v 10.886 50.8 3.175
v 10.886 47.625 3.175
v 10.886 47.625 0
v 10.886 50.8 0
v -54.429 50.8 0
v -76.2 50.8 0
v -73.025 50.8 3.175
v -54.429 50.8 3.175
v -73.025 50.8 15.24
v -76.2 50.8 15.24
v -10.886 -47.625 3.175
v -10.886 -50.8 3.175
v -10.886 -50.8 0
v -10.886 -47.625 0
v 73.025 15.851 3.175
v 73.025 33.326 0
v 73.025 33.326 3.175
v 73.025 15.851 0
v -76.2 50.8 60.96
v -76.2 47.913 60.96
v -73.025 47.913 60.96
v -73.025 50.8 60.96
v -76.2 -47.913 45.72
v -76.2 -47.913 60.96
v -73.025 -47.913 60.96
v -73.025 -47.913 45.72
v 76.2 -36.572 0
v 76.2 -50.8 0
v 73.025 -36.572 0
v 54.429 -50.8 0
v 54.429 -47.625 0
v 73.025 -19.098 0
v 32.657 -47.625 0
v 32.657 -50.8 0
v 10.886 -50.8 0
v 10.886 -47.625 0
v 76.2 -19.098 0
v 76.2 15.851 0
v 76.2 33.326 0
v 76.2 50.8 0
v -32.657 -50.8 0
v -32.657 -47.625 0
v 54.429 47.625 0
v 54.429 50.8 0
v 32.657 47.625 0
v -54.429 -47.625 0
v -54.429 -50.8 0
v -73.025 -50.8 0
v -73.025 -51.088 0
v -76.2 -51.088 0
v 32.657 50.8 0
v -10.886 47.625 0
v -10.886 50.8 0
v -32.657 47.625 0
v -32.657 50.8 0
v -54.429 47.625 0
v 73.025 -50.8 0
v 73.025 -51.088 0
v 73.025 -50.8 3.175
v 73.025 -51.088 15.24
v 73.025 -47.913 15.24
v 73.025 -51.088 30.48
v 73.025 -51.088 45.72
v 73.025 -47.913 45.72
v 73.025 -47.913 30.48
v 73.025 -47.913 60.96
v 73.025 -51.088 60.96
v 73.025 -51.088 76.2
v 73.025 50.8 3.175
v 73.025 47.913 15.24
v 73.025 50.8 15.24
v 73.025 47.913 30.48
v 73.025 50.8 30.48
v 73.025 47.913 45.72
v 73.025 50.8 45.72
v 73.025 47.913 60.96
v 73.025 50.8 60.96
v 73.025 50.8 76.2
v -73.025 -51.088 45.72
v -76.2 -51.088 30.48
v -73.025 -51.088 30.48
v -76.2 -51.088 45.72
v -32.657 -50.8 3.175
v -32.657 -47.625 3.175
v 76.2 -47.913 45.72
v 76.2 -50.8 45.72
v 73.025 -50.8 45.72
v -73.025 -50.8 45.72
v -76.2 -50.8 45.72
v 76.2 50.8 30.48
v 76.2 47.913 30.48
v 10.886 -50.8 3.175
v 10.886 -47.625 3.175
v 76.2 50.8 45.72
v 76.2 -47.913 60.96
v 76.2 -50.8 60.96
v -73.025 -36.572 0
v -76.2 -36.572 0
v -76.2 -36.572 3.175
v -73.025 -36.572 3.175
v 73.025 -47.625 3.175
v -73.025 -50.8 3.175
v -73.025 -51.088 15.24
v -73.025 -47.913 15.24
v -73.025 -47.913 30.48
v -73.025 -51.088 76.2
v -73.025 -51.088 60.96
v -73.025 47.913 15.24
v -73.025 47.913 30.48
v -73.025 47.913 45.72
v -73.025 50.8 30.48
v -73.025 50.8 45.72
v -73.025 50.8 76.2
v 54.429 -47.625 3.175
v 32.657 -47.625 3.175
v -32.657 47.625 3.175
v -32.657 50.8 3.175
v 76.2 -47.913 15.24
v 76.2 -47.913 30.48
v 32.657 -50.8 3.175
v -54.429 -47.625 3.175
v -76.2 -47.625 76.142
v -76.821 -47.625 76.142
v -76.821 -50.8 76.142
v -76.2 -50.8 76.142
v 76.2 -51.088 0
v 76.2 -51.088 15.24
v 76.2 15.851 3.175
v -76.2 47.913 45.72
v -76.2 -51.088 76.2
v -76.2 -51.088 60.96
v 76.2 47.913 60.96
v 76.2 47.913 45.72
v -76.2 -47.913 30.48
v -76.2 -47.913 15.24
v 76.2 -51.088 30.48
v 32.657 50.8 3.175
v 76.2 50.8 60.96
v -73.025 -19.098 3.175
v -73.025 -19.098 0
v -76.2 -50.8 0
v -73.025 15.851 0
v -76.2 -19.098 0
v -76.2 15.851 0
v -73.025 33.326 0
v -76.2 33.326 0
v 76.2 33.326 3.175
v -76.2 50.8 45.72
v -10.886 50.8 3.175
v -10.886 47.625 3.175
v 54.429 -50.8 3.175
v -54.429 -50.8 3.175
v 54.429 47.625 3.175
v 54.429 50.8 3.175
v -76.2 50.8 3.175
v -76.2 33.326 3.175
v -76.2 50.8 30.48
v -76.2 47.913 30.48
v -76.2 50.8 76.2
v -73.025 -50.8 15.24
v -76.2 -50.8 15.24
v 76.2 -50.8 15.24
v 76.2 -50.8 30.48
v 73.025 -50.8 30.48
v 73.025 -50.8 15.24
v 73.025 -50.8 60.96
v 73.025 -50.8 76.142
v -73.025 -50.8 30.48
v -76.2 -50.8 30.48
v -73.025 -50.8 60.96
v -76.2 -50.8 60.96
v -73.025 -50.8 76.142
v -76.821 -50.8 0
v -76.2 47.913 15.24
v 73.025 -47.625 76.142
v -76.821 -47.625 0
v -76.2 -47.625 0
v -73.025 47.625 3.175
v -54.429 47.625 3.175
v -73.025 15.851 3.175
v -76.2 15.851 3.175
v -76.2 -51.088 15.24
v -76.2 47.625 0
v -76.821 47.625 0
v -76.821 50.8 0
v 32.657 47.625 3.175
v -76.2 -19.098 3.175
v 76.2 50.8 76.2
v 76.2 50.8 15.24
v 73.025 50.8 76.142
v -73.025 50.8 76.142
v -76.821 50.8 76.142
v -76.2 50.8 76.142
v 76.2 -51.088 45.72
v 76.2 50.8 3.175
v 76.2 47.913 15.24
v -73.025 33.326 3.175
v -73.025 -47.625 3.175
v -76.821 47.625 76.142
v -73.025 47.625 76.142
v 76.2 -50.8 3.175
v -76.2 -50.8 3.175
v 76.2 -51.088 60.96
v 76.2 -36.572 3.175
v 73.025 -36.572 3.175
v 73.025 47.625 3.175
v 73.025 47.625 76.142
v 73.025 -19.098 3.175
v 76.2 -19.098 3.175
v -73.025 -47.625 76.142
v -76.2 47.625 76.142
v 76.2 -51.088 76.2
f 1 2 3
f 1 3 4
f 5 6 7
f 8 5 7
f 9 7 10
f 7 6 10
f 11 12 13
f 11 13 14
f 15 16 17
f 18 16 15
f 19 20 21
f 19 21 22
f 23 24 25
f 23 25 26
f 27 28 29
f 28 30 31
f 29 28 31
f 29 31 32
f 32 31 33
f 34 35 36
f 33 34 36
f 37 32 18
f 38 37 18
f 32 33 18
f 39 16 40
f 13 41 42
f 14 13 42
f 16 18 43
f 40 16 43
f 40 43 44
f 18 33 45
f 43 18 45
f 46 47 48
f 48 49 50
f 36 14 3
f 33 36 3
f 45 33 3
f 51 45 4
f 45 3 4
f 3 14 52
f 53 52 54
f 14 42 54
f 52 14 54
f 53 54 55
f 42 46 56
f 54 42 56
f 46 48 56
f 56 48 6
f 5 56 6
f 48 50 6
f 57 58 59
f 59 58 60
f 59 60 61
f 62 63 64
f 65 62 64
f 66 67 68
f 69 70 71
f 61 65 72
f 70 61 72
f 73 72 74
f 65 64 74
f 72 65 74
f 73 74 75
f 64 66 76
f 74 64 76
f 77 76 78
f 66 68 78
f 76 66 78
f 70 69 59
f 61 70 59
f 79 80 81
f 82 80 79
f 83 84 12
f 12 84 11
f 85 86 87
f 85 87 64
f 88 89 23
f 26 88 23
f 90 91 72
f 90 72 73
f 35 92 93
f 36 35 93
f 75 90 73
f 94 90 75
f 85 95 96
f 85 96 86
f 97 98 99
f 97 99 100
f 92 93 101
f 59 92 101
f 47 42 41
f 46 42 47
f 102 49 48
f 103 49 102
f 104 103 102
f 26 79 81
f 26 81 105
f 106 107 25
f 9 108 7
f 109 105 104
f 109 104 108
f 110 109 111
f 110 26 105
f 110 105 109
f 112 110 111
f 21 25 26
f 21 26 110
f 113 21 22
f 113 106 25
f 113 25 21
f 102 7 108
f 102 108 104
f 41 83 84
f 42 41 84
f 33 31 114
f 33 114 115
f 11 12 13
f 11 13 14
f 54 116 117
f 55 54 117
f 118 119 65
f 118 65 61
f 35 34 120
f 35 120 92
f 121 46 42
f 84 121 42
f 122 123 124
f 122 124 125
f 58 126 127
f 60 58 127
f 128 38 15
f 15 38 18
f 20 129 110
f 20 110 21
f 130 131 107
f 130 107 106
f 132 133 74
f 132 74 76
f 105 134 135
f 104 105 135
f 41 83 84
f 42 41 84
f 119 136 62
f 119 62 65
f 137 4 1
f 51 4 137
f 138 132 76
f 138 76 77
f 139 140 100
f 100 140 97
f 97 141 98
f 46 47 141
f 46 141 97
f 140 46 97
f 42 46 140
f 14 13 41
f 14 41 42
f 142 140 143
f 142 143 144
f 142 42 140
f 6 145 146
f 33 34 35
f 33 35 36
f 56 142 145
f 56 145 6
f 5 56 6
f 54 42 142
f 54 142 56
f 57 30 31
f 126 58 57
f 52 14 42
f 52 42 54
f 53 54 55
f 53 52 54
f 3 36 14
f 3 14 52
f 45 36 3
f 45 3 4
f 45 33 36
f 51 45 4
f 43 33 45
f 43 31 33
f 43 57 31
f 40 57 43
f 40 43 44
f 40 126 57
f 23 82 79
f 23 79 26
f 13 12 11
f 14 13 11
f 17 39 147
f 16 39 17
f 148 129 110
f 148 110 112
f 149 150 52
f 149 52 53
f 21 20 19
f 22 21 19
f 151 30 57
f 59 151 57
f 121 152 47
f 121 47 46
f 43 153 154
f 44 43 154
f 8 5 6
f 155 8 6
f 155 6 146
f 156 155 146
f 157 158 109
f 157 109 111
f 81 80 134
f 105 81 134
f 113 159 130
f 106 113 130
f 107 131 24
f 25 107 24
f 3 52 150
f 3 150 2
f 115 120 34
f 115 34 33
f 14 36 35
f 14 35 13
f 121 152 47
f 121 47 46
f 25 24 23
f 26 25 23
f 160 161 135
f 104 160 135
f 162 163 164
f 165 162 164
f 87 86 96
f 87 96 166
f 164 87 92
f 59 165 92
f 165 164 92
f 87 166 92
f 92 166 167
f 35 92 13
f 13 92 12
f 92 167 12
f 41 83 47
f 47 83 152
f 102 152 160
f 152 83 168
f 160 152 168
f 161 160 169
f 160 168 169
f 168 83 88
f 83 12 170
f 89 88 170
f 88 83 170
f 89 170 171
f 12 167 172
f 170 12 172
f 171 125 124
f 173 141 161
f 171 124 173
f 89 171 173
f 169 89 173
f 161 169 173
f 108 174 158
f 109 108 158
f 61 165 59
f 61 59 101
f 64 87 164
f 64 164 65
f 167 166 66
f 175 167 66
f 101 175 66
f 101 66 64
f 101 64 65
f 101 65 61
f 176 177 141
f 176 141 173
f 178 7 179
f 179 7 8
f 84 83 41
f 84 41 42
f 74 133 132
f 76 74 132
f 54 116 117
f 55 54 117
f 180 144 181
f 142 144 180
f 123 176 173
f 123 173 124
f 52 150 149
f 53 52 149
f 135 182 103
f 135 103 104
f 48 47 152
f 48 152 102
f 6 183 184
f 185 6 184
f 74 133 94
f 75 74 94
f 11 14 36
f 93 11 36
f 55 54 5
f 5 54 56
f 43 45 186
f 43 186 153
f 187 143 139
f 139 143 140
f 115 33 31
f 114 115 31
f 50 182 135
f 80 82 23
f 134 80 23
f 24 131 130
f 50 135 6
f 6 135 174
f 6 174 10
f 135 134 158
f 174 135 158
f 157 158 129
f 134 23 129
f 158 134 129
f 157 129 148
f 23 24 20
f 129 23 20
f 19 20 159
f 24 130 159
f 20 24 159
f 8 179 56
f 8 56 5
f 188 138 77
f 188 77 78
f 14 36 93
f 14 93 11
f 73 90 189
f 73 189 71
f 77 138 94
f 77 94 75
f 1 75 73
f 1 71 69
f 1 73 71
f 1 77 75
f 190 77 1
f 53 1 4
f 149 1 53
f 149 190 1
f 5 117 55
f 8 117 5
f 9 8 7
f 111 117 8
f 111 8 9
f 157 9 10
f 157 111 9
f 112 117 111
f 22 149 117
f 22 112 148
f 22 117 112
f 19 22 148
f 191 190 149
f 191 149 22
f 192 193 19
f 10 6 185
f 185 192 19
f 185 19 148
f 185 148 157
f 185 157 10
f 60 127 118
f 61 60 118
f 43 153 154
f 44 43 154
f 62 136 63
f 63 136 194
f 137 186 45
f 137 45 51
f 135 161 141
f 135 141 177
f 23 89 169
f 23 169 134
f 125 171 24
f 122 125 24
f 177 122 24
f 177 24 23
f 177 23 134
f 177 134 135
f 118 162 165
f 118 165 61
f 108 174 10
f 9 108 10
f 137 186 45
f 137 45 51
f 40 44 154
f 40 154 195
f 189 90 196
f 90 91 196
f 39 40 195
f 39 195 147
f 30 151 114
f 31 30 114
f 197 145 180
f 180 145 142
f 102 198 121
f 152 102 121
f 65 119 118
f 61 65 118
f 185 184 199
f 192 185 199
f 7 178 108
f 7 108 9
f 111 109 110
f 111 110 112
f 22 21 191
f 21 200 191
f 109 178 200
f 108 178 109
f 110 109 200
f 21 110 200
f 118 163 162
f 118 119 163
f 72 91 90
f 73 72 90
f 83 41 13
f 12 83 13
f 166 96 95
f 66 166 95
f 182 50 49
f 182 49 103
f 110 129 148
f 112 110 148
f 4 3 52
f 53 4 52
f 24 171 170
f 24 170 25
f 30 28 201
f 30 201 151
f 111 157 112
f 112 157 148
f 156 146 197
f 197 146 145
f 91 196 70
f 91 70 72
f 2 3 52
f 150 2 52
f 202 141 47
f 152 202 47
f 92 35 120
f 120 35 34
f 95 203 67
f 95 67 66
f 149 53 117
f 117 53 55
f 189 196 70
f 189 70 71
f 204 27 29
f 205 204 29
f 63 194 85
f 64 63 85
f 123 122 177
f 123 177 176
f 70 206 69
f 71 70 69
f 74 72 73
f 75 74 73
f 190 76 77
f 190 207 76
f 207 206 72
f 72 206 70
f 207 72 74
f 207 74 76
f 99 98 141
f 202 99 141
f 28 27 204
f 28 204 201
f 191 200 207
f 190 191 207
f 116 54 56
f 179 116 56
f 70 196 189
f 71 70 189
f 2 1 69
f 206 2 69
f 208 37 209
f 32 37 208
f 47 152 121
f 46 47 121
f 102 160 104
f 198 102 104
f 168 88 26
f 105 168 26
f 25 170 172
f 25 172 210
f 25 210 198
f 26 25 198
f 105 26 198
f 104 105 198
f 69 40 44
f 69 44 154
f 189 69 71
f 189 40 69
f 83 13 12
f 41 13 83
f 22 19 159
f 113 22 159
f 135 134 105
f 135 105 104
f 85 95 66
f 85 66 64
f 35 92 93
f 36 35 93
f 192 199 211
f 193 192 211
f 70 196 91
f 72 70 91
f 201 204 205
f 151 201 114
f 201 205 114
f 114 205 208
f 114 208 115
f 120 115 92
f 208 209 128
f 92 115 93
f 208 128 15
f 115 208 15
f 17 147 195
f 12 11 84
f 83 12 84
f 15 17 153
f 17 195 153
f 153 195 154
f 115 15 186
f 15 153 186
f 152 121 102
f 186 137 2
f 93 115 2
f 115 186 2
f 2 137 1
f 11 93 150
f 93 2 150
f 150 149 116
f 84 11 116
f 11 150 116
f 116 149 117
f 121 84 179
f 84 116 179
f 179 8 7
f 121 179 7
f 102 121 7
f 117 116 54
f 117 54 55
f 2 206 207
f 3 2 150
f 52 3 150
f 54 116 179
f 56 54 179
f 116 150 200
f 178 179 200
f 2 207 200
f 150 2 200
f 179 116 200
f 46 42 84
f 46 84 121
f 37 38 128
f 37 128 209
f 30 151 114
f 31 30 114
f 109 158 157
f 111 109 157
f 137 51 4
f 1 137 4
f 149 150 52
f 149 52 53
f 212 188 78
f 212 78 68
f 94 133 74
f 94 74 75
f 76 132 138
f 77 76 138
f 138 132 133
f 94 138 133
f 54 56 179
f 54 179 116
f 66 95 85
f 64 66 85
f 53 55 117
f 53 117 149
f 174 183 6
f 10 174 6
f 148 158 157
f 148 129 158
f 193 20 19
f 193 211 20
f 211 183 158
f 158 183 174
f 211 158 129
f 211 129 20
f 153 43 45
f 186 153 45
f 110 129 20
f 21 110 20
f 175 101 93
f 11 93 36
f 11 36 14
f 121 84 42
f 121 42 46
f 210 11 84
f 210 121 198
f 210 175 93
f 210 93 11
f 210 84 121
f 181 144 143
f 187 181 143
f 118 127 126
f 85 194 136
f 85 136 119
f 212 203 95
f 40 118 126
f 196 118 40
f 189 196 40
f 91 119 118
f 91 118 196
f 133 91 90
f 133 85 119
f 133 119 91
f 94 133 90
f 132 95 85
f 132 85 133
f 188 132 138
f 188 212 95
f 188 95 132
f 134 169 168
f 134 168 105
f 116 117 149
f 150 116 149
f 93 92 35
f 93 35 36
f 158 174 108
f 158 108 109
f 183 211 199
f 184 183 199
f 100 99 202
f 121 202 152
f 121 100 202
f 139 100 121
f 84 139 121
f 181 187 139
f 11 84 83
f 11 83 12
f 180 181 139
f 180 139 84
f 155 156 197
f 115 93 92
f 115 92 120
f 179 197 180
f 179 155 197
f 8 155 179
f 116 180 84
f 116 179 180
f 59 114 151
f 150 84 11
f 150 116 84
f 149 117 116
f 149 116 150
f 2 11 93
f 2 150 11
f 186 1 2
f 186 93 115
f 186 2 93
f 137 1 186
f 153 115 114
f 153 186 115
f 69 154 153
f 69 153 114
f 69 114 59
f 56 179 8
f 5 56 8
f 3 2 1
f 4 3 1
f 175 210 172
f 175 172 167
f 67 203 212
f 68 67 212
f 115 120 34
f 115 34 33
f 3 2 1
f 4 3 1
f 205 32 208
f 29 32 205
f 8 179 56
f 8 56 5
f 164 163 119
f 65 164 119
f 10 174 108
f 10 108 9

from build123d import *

# Parameters (mm, degrees)
F0_W     = 18.5964285714
F0_H     = 3.175
F0_W_2   = 3.175
F0_H_2   = 14.2994610153
F0_H_3   = 17.4744610153
F0_H_4   = 11.0526949236
F0_W_3   = 21.7714285714
F1_DEPTH = 3.175
F2_W     = 3.175
F2_H     = 15.24
F2_W_2   = 2.8866035402
F3_DEPTH = 3.175
F6_DEPTH = 3.175


with BuildPart() as f1:
    # F0 (on Top) → F1 (new body)
    with BuildSketch(Plane.XY):
        with Locations((-63.7267857143, 49.2125)):
            Rectangle(F0_W, F0_H)
        with Locations((-74.6125, 49.2125)):
            Rectangle(F0_W_2, F0_H)
        with Locations((-74.6125, 40.4752694924)):
            Rectangle(F0_W_2, F0_H_2)
        with Locations((-74.6125, 7.1138474618)):
            Rectangle(F0_W_2, F0_H_3)
        with Locations((-74.6125, -10.3606135535)):
            Rectangle(F0_W_2, F0_H_3)
        with Locations((-74.6125, -42.0986525382)):
            Rectangle(F0_W_2, F0_H_4)
        with Locations((-74.6125, -49.2125)):
            Rectangle(F0_W_2, F0_H)
        with Locations((-63.7267857143, -49.2125)):
            Rectangle(F0_W, F0_H)
        with Locations((-21.7714285714, -49.2125)):
            Rectangle(F0_W_3, F0_H)
        with Locations((21.7714285714, -49.2125)):
            Rectangle(F0_W_3, F0_H)
        with Locations((63.7267857143, -49.2125)):
            Rectangle(F0_W, F0_H)
        with Locations((74.6125, -42.0986525382)):
            Rectangle(F0_W_2, F0_H_4)
        with Locations((74.6125, -10.3606135535)):
            Rectangle(F0_W_2, F0_H_3)
        with Locations((74.6125, 7.1138474618)):
            Rectangle(F0_W_2, F0_H_3)
        with Locations((74.6125, 40.4752694924)):
            Rectangle(F0_W_2, F0_H_2)
        with Locations((74.6125, 49.2125)):
            Rectangle(F0_W_2, F0_H)
        with Locations((63.7267857143, 49.2125)):
            Rectangle(F0_W, F0_H)
        with Locations((21.7714285714, 49.2125)):
            Rectangle(F0_W_3, F0_H)
        with Locations((-21.7714285714, 49.2125)):
            Rectangle(F0_W_3, F0_H)
        Polygon((73.025, 33.3255389847), (73.025, 47.625), (54.4285714286, 47.625), (32.6571428571, 47.625), (10.8857142857, 47.625), (-10.8857142857, 47.625), (-32.6571428571, 47.625), (-54.4285714286, 47.625), (-73.025, 47.625), (-73.025, 33.3255389847), (-73.025, 15.8510779694), (-73.025, -1.6233830458), (-73.025, -19.0978440611), (-73.025, -36.5723050764), (-73.025, -47.625), (-54.4285714286, -47.625), (-32.6571428571, -47.625), (-10.8857142857, -47.625), (10.8857142857, -47.625), (32.6571428571, -47.625), (54.4285714286, -47.625), (73.025, -47.625), (73.025, -36.5723050764), (73.025, -19.0978440611), (73.025, -1.6233830458), (73.025, 15.8510779694), align=None)
    extrude(amount=F1_DEPTH)

    # F2 (on face) → F3 (join)
    with BuildSketch(Plane.YZ.offset(76.2)):
        with Locations((-49.5008964598, 68.58)):
            Rectangle(F2_W, F2_H)
        with Locations((-49.5008964598, 38.1)):
            Rectangle(F2_W, F2_H)
        with Locations((-49.5008964598, 7.62)):
            Rectangle(F2_W, F2_H)
        with Locations((49.3566982299, 38.1)):
            Rectangle(F2_W_2, F2_H)
        with Locations((49.3566982299, 7.62)):
            Rectangle(F2_W_2, F2_H)
        with Locations((49.3566982299, 68.58)):
            Rectangle(F2_W_2, F2_H)
        Polygon((-36.5723050764, 0), (47.9133964598, 0), (47.9133964598, 15.24), (47.9133964598, 30.48), (47.9133964598, 45.72), (47.9133964598, 60.96), (47.9133964598, 76.2), (-47.9133964598, 76.2), (-47.9133964598, 60.96), (-47.9133964598, 45.72), (-47.9133964598, 30.48), (-47.9133964598, 15.24), (-47.9133964598, 0), (-47.625, 0), (-47.625, 3.175), (-36.5723050764, 3.175), align=None)
    extrude(amount=-F3_DEPTH)


with BuildPart() as f4_1:
    # F4: instance of F1
    add(f1.part.mirror(Plane.YZ))


with BuildPart() as f6:
    # F5 (on face) → F6 (new body)
    with BuildSketch(Plane(origin=(0, 47.625, 0), x_dir=(-1, 0, 0), z_dir=(0, 1, 0))):
        Polygon((-76.2, 76.1423557997), (-76.2, 0), (-54.4285714286, 0), (-54.4285714286, 3.175), (-32.6571428571, 3.175), (-32.6571428571, 0), (76.8211558461, 0), (76.8211558461, 76.1423557997), align=None)
    extrude(amount=F6_DEPTH)


with BuildPart() as f7_1:
    # F7: instance of F6
    add(f6.part.mirror(Plane.XZ))

    # F8: cut F1, F4_1
    add(f1.part, mode=Mode.SUBTRACT)
    add(f4_1.part, mode=Mode.SUBTRACT)


with BuildPart() as f6_1:
    add(f6.part)

    # F8: cut F1, F4_1
    add(f1.part, mode=Mode.SUBTRACT)
    add(f4_1.part, mode=Mode.SUBTRACT)


solid = Compound([f1.part, f4_1.part, f7_1.part, f6_1.part])
